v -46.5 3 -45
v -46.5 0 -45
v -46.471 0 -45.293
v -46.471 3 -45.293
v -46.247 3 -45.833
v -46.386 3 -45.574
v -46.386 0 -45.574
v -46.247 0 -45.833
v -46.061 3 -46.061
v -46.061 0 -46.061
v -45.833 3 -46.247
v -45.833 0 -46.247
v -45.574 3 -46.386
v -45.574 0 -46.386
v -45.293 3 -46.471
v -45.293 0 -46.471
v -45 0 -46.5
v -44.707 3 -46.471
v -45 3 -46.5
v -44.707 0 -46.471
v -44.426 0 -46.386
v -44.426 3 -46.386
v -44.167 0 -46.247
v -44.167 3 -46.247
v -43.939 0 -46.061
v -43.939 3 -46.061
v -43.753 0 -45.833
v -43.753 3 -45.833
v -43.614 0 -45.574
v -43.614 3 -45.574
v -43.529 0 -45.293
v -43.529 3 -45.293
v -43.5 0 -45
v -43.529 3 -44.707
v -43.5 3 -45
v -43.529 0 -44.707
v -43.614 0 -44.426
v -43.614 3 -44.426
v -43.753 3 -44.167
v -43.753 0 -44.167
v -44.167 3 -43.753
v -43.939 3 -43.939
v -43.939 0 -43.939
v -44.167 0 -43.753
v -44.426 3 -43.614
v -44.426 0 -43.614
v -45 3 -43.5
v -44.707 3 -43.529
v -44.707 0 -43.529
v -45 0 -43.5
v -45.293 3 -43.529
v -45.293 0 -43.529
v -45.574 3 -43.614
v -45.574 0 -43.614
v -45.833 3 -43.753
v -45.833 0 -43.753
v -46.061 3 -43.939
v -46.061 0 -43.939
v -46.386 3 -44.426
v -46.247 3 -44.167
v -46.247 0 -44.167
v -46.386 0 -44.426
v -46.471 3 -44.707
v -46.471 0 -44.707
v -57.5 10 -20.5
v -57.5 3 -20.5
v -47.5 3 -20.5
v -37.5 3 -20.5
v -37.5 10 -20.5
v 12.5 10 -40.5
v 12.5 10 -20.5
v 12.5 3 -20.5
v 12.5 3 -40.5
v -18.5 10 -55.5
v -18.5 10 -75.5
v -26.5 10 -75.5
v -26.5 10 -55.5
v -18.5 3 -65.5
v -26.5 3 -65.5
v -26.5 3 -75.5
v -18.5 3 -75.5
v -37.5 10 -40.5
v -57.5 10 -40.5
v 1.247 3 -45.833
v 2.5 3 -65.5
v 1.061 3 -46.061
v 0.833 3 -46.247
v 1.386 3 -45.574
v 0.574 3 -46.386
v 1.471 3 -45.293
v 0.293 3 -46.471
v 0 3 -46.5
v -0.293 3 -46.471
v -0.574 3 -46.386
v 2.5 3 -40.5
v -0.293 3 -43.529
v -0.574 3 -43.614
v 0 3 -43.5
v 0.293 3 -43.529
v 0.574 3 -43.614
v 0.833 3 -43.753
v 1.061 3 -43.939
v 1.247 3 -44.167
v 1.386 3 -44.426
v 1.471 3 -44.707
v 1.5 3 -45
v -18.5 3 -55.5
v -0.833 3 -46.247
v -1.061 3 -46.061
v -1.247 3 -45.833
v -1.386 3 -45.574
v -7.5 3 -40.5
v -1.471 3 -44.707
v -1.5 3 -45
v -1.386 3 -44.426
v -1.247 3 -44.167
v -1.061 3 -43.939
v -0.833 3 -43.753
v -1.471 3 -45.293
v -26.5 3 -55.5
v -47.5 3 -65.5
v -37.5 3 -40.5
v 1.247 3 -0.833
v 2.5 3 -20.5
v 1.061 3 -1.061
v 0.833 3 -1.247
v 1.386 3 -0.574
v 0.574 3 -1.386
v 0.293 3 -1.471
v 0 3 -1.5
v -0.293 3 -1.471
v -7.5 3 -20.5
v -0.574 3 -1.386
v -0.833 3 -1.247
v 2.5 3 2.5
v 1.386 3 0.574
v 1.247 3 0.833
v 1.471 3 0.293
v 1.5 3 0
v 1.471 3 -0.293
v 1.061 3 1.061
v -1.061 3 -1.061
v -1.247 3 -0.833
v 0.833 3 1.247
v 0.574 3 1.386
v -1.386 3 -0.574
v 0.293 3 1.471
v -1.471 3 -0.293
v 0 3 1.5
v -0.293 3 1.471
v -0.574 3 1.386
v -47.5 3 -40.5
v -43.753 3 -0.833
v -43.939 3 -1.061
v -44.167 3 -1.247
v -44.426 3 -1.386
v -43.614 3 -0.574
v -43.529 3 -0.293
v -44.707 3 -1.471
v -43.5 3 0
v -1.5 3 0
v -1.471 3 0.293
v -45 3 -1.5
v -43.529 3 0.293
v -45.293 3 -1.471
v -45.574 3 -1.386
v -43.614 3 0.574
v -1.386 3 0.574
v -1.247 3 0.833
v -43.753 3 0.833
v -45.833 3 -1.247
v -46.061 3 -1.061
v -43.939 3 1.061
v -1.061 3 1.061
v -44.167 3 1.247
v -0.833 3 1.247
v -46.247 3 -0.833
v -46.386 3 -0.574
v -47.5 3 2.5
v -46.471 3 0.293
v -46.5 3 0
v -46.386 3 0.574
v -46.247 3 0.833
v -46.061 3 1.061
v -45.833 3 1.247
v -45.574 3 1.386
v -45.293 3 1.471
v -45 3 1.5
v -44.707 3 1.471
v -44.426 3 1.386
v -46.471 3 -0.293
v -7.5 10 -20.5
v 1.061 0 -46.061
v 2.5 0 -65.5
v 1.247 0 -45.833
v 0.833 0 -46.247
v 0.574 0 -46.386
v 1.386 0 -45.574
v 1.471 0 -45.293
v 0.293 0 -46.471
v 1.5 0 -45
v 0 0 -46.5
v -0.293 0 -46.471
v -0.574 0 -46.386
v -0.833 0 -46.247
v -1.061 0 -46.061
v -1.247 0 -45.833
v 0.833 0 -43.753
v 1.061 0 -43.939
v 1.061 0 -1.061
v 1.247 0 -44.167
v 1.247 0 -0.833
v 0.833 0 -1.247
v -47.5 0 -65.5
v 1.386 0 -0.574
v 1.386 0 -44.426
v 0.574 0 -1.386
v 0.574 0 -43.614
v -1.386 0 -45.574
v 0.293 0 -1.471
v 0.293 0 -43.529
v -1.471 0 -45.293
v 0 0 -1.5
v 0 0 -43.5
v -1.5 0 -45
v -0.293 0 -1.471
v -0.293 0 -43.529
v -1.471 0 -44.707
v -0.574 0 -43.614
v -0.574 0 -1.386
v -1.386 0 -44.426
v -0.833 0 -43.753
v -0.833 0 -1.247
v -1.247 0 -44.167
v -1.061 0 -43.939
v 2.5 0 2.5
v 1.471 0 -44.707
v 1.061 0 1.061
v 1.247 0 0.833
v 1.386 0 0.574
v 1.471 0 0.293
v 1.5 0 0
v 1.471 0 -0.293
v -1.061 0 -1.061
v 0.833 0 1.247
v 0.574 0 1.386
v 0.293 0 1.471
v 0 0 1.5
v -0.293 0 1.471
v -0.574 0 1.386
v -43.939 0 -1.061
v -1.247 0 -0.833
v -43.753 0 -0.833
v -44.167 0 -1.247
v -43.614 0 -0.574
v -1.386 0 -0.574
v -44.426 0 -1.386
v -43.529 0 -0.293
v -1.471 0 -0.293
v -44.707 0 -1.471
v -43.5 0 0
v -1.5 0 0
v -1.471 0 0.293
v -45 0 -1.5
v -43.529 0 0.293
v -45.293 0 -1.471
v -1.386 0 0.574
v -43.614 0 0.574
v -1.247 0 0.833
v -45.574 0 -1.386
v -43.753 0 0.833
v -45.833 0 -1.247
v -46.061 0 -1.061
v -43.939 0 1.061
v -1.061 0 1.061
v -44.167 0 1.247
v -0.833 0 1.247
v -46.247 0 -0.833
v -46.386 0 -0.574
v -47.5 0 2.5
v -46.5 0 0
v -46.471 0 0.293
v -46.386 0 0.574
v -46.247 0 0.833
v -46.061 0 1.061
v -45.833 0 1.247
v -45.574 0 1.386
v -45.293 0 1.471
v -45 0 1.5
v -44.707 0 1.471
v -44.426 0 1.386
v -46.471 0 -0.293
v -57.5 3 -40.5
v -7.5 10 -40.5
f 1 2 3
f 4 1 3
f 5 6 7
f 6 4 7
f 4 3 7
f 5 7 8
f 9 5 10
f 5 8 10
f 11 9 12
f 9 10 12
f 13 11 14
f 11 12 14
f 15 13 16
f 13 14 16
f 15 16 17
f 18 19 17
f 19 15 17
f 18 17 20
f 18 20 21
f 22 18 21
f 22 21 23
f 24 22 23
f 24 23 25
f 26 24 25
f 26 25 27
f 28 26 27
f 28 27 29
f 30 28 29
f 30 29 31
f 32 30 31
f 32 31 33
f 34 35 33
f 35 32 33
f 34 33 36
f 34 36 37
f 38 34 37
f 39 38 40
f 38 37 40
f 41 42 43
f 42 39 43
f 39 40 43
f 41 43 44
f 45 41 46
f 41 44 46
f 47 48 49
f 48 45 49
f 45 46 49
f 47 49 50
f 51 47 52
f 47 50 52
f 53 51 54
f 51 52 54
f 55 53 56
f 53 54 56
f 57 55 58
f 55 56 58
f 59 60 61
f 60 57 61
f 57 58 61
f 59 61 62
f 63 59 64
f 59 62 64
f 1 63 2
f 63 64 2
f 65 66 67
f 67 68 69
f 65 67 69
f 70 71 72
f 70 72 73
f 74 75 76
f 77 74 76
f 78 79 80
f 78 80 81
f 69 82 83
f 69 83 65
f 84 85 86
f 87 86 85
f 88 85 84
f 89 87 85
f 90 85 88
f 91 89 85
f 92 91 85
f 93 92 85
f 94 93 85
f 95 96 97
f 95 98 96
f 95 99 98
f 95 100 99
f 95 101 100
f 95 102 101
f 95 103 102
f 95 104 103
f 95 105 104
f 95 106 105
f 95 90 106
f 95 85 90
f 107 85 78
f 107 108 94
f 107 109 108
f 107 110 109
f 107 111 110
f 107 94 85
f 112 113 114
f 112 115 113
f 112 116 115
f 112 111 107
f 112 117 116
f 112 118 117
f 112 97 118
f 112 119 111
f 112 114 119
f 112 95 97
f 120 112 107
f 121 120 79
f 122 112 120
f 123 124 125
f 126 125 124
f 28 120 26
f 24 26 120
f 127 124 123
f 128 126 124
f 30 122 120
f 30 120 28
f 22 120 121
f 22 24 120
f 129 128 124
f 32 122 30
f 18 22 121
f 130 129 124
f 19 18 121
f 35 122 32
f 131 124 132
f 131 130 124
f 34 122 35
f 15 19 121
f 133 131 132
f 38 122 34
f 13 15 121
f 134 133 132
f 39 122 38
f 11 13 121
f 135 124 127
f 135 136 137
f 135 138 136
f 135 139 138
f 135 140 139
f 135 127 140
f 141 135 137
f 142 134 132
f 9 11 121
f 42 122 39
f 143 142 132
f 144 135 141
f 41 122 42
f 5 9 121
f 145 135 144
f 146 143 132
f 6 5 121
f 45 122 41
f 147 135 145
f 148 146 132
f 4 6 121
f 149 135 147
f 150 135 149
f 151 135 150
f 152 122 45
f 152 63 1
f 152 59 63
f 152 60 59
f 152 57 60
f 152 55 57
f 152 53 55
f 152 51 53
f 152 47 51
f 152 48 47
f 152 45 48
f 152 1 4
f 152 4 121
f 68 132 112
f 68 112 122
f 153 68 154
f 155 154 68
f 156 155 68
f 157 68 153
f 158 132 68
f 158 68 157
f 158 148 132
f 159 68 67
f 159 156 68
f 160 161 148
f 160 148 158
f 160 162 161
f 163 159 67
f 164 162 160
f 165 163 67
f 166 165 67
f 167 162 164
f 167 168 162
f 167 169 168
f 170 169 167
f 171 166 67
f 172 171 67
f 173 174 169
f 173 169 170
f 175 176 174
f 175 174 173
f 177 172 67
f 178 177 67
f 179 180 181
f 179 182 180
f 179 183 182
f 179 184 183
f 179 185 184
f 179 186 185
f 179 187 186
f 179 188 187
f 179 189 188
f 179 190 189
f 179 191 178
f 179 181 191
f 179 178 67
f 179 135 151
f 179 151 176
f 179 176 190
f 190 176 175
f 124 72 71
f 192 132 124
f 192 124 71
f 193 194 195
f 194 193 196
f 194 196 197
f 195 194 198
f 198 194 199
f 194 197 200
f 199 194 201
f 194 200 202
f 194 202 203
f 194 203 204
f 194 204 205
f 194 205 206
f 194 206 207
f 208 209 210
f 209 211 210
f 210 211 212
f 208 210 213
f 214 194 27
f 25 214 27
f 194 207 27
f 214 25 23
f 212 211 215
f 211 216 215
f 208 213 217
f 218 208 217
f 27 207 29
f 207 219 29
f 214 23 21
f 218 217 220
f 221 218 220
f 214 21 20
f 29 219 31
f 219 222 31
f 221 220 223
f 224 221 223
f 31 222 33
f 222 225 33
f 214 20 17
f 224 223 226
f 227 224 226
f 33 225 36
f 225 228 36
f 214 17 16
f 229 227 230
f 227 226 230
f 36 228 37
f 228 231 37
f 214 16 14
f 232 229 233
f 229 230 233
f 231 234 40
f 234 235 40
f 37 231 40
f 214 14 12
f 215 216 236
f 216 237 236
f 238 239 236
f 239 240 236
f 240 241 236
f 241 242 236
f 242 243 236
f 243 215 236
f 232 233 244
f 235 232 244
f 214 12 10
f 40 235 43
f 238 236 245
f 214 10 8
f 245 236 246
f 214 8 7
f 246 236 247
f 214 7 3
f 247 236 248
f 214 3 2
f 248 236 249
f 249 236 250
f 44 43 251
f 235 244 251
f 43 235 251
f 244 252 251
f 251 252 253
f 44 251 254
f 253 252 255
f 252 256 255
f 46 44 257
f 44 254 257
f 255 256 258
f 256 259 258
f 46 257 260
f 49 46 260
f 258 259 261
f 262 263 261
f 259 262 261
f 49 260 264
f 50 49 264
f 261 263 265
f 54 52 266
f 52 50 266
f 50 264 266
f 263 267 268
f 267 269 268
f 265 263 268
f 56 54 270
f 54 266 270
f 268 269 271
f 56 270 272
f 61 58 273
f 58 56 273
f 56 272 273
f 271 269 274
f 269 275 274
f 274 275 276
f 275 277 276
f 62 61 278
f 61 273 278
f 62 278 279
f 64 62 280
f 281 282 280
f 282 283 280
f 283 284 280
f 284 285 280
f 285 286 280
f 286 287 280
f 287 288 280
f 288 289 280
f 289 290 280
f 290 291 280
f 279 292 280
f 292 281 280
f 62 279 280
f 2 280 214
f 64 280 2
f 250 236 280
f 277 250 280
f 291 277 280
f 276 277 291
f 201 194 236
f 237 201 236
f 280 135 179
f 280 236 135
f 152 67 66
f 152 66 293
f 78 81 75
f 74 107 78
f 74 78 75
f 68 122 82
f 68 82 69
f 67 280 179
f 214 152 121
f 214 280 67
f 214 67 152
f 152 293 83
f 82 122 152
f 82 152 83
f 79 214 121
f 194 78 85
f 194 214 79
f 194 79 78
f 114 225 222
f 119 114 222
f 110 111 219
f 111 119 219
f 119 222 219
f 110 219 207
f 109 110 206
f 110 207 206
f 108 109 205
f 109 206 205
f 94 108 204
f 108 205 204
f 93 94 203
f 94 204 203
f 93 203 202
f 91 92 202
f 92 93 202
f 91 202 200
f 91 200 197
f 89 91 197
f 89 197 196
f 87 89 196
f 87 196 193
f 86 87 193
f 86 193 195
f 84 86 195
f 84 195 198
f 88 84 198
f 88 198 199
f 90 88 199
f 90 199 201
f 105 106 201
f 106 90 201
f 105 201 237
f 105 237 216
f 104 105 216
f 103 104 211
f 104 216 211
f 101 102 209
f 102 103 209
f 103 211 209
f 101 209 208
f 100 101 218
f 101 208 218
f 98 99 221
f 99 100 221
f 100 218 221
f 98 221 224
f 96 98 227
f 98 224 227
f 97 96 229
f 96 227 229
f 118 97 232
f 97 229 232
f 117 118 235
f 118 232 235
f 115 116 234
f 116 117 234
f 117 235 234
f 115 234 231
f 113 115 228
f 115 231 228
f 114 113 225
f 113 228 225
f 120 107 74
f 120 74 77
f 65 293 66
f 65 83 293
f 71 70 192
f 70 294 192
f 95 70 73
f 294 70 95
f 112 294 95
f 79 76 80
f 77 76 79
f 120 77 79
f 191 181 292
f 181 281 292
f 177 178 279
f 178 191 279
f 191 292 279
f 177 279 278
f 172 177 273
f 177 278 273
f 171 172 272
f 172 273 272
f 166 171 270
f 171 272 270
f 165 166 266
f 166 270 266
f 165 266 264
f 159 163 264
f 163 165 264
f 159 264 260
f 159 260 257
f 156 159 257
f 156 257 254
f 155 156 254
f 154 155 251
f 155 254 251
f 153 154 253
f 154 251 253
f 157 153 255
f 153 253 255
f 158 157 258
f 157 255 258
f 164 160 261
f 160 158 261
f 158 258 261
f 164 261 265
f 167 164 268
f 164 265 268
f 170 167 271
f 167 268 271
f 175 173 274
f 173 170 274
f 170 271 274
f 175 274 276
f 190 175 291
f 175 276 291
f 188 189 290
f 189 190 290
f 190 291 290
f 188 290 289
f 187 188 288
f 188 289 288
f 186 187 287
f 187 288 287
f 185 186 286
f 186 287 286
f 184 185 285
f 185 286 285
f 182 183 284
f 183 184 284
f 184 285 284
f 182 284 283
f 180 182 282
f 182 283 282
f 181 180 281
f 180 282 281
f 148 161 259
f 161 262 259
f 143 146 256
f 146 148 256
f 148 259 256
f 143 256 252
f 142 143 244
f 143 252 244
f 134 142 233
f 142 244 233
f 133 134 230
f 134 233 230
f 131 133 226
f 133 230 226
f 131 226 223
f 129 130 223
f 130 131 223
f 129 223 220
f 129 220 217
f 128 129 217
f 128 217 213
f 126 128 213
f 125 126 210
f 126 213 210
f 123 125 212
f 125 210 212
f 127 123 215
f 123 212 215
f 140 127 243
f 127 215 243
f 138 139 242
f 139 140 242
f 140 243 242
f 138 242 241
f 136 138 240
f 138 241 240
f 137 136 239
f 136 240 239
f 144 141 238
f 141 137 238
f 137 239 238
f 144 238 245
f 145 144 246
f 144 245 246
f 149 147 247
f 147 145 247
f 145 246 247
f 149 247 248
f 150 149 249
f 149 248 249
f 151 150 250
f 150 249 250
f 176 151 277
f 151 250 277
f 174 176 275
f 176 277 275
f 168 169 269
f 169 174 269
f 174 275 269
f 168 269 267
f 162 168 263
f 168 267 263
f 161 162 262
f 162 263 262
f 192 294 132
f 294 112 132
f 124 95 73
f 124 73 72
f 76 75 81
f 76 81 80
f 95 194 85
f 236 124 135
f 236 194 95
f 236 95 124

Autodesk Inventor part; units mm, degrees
ref_plane "YZ Plane" through (0, 0, 0) normal (1, 0, 0) x (0, 1, 0)
ref_plane "XZ Plane" through (0, 0, 0) normal (0, 1, 0) x (-1, 0, 0)
ref_plane "XY Plane" through (0, 0, 0) normal (0, 0, 1) x (1, 0, 0)
sketch "Sketch1" plane through (0, 0, 0) normal (0, 1, 0) x (-1, 0, 0)
  line L0 (0, 0) -> (45, 0) construction
  line L1 (45, 0) -> (45, -45) construction
  line L2 (45, -45) -> (0, -45) construction
  line L3 (0, -45) -> (0, 0) construction
  circle A0 centre (45, 0) radius 1.5
  circle A1 centre (45, -45) radius 1.5
  circle A2 centre (0, -45) radius 1.5
  circle A3 centre (0, 0) radius 1.5
  line L4 (-2.5, 2.5) -> (47.5, 2.5)
  line L5 (47.5, 2.5) -> (47.5, -65.5)
  line L6 (47.5, -65.5) -> (-2.5, -65.5)
  line L7 (-2.5, -65.5) -> (-2.5, 2.5)
  dimension "d0" = 45
  dimension "d1" = 45
  dimension "d2" = 3
  dimension "d3" = 3
  dimension "d4" = 3
  dimension "d5" = 3
  dimension "d6" = 50
  dimension "d7" = 68
  dimension "d8" = 2.5
  dimension "d9" = 2.5
extrude "Extrusion1" add sketch "Sketch1" along normal blind 3
sketch "Sketch2" plane through (0, 3, 0) normal (0, 1, 0) x (1, 0, 0)
  line L0 (2.5, -2.5) -> (2.5, 65.5) projected
  line L1 (2.5, 40.5) -> (-7.5, 40.5)
  line L2 (-7.5, 40.5) -> (-7.5, 20.5)
  line L3 (-7.5, 20.5) -> (2.5, 20.5)
  line L4 (2.5, 20.5) -> (2.5, 40.5)
  line L5 (2.5, 65.5) -> (-47.5, 65.5) projected
  line L6 (-47.5, 65.5) -> (-47.5, -2.5) projected
  line L7 (-47.5, 40.5) -> (-37.5, 40.5)
  line L8 (-37.5, 40.5) -> (-37.5, 20.5)
  line L9 (-37.5, 20.5) -> (-47.5, 20.5)
  line L10 (-47.5, 20.5) -> (-47.5, 40.5)
  line L11 (-26.5, 65.5) -> (-18.5, 65.5)
  line L12 (-18.5, 65.5) -> (-18.5, 55.5)
  line L13 (-18.5, 55.5) -> (-26.5, 55.5)
  line L14 (-26.5, 55.5) -> (-26.5, 65.5)
  point P0 (0, 0)
  point P1 (2.5, 20.5)
  dimension "d12" = 10
  dimension "d13" = 20
  dimension "d14" = 25
  dimension "d15" = 10
  dimension "d16" = 20
  dimension "d19" = 8
  dimension "d20" = 10
  dimension "d21" = 50
  dimension "d22" = 68
  dimension "d23" = 21
extrude "Extrusion2" add sketch "Sketch2" along normal blind 7
sketch "Sketch3" plane through (2.5, 0, 2.5) normal (1, 0, 0) x (0, 0, -1)
  line L0 (43, 10) -> (23, 10) projected
  line L1 (43, 3) -> (23, 3) projected
  line L2 (23, 10) -> (43, 10)
  line L3 (43, 10) -> (43, 3)
  line L4 (43, 3) -> (23, 3)
  line L5 (23, 3) -> (23, 10)
  point P0 (2.5, 0)
extrude "Extrusion3" add sketch "Sketch3" along normal blind 10
sketch "Sketch4" plane through (-47.5, 0, -65.5) normal (-1, 0, 0) x (0, 0, 1)
  line L0 (25, 3) -> (25, 10) projected
  line L1 (45, 3) -> (45, 10) projected
  line L2 (25, 10) -> (45, 10)
  line L3 (45, 10) -> (45, 3)
  line L4 (45, 3) -> (25, 3)
  line L5 (25, 3) -> (25, 10)
  point P0 (65.5, 0)
extrude "Extrusion4" add sketch "Sketch4" along normal blind 10
sketch "Sketch5" plane through (2.5, 0, -65.5) normal (0, 0, -1) x (-1, 0, 0)
  line L0 (21, 10) -> (29, 10) projected
  line L1 (29, 3) -> (50, 3) projected
  line L2 (21, 10) -> (29, 10)
  line L3 (29, 10) -> (29, 3)
  line L4 (29, 3) -> (21, 3)
  line L5 (21, 3) -> (21, 10)
  point P0 (2.5, 0)
extrude "Extrusion5" add sketch "Sketch5" along normal blind 10
equation "\"d8\" = -0.5 * d0 + 0.5 * d6"
equation "\"d9\" = d8"
equation "\"d23\" = -0.5 * d19 + 0.5 * d21"
properties part number "Holybro PM07 PowerDistributionBoard"
